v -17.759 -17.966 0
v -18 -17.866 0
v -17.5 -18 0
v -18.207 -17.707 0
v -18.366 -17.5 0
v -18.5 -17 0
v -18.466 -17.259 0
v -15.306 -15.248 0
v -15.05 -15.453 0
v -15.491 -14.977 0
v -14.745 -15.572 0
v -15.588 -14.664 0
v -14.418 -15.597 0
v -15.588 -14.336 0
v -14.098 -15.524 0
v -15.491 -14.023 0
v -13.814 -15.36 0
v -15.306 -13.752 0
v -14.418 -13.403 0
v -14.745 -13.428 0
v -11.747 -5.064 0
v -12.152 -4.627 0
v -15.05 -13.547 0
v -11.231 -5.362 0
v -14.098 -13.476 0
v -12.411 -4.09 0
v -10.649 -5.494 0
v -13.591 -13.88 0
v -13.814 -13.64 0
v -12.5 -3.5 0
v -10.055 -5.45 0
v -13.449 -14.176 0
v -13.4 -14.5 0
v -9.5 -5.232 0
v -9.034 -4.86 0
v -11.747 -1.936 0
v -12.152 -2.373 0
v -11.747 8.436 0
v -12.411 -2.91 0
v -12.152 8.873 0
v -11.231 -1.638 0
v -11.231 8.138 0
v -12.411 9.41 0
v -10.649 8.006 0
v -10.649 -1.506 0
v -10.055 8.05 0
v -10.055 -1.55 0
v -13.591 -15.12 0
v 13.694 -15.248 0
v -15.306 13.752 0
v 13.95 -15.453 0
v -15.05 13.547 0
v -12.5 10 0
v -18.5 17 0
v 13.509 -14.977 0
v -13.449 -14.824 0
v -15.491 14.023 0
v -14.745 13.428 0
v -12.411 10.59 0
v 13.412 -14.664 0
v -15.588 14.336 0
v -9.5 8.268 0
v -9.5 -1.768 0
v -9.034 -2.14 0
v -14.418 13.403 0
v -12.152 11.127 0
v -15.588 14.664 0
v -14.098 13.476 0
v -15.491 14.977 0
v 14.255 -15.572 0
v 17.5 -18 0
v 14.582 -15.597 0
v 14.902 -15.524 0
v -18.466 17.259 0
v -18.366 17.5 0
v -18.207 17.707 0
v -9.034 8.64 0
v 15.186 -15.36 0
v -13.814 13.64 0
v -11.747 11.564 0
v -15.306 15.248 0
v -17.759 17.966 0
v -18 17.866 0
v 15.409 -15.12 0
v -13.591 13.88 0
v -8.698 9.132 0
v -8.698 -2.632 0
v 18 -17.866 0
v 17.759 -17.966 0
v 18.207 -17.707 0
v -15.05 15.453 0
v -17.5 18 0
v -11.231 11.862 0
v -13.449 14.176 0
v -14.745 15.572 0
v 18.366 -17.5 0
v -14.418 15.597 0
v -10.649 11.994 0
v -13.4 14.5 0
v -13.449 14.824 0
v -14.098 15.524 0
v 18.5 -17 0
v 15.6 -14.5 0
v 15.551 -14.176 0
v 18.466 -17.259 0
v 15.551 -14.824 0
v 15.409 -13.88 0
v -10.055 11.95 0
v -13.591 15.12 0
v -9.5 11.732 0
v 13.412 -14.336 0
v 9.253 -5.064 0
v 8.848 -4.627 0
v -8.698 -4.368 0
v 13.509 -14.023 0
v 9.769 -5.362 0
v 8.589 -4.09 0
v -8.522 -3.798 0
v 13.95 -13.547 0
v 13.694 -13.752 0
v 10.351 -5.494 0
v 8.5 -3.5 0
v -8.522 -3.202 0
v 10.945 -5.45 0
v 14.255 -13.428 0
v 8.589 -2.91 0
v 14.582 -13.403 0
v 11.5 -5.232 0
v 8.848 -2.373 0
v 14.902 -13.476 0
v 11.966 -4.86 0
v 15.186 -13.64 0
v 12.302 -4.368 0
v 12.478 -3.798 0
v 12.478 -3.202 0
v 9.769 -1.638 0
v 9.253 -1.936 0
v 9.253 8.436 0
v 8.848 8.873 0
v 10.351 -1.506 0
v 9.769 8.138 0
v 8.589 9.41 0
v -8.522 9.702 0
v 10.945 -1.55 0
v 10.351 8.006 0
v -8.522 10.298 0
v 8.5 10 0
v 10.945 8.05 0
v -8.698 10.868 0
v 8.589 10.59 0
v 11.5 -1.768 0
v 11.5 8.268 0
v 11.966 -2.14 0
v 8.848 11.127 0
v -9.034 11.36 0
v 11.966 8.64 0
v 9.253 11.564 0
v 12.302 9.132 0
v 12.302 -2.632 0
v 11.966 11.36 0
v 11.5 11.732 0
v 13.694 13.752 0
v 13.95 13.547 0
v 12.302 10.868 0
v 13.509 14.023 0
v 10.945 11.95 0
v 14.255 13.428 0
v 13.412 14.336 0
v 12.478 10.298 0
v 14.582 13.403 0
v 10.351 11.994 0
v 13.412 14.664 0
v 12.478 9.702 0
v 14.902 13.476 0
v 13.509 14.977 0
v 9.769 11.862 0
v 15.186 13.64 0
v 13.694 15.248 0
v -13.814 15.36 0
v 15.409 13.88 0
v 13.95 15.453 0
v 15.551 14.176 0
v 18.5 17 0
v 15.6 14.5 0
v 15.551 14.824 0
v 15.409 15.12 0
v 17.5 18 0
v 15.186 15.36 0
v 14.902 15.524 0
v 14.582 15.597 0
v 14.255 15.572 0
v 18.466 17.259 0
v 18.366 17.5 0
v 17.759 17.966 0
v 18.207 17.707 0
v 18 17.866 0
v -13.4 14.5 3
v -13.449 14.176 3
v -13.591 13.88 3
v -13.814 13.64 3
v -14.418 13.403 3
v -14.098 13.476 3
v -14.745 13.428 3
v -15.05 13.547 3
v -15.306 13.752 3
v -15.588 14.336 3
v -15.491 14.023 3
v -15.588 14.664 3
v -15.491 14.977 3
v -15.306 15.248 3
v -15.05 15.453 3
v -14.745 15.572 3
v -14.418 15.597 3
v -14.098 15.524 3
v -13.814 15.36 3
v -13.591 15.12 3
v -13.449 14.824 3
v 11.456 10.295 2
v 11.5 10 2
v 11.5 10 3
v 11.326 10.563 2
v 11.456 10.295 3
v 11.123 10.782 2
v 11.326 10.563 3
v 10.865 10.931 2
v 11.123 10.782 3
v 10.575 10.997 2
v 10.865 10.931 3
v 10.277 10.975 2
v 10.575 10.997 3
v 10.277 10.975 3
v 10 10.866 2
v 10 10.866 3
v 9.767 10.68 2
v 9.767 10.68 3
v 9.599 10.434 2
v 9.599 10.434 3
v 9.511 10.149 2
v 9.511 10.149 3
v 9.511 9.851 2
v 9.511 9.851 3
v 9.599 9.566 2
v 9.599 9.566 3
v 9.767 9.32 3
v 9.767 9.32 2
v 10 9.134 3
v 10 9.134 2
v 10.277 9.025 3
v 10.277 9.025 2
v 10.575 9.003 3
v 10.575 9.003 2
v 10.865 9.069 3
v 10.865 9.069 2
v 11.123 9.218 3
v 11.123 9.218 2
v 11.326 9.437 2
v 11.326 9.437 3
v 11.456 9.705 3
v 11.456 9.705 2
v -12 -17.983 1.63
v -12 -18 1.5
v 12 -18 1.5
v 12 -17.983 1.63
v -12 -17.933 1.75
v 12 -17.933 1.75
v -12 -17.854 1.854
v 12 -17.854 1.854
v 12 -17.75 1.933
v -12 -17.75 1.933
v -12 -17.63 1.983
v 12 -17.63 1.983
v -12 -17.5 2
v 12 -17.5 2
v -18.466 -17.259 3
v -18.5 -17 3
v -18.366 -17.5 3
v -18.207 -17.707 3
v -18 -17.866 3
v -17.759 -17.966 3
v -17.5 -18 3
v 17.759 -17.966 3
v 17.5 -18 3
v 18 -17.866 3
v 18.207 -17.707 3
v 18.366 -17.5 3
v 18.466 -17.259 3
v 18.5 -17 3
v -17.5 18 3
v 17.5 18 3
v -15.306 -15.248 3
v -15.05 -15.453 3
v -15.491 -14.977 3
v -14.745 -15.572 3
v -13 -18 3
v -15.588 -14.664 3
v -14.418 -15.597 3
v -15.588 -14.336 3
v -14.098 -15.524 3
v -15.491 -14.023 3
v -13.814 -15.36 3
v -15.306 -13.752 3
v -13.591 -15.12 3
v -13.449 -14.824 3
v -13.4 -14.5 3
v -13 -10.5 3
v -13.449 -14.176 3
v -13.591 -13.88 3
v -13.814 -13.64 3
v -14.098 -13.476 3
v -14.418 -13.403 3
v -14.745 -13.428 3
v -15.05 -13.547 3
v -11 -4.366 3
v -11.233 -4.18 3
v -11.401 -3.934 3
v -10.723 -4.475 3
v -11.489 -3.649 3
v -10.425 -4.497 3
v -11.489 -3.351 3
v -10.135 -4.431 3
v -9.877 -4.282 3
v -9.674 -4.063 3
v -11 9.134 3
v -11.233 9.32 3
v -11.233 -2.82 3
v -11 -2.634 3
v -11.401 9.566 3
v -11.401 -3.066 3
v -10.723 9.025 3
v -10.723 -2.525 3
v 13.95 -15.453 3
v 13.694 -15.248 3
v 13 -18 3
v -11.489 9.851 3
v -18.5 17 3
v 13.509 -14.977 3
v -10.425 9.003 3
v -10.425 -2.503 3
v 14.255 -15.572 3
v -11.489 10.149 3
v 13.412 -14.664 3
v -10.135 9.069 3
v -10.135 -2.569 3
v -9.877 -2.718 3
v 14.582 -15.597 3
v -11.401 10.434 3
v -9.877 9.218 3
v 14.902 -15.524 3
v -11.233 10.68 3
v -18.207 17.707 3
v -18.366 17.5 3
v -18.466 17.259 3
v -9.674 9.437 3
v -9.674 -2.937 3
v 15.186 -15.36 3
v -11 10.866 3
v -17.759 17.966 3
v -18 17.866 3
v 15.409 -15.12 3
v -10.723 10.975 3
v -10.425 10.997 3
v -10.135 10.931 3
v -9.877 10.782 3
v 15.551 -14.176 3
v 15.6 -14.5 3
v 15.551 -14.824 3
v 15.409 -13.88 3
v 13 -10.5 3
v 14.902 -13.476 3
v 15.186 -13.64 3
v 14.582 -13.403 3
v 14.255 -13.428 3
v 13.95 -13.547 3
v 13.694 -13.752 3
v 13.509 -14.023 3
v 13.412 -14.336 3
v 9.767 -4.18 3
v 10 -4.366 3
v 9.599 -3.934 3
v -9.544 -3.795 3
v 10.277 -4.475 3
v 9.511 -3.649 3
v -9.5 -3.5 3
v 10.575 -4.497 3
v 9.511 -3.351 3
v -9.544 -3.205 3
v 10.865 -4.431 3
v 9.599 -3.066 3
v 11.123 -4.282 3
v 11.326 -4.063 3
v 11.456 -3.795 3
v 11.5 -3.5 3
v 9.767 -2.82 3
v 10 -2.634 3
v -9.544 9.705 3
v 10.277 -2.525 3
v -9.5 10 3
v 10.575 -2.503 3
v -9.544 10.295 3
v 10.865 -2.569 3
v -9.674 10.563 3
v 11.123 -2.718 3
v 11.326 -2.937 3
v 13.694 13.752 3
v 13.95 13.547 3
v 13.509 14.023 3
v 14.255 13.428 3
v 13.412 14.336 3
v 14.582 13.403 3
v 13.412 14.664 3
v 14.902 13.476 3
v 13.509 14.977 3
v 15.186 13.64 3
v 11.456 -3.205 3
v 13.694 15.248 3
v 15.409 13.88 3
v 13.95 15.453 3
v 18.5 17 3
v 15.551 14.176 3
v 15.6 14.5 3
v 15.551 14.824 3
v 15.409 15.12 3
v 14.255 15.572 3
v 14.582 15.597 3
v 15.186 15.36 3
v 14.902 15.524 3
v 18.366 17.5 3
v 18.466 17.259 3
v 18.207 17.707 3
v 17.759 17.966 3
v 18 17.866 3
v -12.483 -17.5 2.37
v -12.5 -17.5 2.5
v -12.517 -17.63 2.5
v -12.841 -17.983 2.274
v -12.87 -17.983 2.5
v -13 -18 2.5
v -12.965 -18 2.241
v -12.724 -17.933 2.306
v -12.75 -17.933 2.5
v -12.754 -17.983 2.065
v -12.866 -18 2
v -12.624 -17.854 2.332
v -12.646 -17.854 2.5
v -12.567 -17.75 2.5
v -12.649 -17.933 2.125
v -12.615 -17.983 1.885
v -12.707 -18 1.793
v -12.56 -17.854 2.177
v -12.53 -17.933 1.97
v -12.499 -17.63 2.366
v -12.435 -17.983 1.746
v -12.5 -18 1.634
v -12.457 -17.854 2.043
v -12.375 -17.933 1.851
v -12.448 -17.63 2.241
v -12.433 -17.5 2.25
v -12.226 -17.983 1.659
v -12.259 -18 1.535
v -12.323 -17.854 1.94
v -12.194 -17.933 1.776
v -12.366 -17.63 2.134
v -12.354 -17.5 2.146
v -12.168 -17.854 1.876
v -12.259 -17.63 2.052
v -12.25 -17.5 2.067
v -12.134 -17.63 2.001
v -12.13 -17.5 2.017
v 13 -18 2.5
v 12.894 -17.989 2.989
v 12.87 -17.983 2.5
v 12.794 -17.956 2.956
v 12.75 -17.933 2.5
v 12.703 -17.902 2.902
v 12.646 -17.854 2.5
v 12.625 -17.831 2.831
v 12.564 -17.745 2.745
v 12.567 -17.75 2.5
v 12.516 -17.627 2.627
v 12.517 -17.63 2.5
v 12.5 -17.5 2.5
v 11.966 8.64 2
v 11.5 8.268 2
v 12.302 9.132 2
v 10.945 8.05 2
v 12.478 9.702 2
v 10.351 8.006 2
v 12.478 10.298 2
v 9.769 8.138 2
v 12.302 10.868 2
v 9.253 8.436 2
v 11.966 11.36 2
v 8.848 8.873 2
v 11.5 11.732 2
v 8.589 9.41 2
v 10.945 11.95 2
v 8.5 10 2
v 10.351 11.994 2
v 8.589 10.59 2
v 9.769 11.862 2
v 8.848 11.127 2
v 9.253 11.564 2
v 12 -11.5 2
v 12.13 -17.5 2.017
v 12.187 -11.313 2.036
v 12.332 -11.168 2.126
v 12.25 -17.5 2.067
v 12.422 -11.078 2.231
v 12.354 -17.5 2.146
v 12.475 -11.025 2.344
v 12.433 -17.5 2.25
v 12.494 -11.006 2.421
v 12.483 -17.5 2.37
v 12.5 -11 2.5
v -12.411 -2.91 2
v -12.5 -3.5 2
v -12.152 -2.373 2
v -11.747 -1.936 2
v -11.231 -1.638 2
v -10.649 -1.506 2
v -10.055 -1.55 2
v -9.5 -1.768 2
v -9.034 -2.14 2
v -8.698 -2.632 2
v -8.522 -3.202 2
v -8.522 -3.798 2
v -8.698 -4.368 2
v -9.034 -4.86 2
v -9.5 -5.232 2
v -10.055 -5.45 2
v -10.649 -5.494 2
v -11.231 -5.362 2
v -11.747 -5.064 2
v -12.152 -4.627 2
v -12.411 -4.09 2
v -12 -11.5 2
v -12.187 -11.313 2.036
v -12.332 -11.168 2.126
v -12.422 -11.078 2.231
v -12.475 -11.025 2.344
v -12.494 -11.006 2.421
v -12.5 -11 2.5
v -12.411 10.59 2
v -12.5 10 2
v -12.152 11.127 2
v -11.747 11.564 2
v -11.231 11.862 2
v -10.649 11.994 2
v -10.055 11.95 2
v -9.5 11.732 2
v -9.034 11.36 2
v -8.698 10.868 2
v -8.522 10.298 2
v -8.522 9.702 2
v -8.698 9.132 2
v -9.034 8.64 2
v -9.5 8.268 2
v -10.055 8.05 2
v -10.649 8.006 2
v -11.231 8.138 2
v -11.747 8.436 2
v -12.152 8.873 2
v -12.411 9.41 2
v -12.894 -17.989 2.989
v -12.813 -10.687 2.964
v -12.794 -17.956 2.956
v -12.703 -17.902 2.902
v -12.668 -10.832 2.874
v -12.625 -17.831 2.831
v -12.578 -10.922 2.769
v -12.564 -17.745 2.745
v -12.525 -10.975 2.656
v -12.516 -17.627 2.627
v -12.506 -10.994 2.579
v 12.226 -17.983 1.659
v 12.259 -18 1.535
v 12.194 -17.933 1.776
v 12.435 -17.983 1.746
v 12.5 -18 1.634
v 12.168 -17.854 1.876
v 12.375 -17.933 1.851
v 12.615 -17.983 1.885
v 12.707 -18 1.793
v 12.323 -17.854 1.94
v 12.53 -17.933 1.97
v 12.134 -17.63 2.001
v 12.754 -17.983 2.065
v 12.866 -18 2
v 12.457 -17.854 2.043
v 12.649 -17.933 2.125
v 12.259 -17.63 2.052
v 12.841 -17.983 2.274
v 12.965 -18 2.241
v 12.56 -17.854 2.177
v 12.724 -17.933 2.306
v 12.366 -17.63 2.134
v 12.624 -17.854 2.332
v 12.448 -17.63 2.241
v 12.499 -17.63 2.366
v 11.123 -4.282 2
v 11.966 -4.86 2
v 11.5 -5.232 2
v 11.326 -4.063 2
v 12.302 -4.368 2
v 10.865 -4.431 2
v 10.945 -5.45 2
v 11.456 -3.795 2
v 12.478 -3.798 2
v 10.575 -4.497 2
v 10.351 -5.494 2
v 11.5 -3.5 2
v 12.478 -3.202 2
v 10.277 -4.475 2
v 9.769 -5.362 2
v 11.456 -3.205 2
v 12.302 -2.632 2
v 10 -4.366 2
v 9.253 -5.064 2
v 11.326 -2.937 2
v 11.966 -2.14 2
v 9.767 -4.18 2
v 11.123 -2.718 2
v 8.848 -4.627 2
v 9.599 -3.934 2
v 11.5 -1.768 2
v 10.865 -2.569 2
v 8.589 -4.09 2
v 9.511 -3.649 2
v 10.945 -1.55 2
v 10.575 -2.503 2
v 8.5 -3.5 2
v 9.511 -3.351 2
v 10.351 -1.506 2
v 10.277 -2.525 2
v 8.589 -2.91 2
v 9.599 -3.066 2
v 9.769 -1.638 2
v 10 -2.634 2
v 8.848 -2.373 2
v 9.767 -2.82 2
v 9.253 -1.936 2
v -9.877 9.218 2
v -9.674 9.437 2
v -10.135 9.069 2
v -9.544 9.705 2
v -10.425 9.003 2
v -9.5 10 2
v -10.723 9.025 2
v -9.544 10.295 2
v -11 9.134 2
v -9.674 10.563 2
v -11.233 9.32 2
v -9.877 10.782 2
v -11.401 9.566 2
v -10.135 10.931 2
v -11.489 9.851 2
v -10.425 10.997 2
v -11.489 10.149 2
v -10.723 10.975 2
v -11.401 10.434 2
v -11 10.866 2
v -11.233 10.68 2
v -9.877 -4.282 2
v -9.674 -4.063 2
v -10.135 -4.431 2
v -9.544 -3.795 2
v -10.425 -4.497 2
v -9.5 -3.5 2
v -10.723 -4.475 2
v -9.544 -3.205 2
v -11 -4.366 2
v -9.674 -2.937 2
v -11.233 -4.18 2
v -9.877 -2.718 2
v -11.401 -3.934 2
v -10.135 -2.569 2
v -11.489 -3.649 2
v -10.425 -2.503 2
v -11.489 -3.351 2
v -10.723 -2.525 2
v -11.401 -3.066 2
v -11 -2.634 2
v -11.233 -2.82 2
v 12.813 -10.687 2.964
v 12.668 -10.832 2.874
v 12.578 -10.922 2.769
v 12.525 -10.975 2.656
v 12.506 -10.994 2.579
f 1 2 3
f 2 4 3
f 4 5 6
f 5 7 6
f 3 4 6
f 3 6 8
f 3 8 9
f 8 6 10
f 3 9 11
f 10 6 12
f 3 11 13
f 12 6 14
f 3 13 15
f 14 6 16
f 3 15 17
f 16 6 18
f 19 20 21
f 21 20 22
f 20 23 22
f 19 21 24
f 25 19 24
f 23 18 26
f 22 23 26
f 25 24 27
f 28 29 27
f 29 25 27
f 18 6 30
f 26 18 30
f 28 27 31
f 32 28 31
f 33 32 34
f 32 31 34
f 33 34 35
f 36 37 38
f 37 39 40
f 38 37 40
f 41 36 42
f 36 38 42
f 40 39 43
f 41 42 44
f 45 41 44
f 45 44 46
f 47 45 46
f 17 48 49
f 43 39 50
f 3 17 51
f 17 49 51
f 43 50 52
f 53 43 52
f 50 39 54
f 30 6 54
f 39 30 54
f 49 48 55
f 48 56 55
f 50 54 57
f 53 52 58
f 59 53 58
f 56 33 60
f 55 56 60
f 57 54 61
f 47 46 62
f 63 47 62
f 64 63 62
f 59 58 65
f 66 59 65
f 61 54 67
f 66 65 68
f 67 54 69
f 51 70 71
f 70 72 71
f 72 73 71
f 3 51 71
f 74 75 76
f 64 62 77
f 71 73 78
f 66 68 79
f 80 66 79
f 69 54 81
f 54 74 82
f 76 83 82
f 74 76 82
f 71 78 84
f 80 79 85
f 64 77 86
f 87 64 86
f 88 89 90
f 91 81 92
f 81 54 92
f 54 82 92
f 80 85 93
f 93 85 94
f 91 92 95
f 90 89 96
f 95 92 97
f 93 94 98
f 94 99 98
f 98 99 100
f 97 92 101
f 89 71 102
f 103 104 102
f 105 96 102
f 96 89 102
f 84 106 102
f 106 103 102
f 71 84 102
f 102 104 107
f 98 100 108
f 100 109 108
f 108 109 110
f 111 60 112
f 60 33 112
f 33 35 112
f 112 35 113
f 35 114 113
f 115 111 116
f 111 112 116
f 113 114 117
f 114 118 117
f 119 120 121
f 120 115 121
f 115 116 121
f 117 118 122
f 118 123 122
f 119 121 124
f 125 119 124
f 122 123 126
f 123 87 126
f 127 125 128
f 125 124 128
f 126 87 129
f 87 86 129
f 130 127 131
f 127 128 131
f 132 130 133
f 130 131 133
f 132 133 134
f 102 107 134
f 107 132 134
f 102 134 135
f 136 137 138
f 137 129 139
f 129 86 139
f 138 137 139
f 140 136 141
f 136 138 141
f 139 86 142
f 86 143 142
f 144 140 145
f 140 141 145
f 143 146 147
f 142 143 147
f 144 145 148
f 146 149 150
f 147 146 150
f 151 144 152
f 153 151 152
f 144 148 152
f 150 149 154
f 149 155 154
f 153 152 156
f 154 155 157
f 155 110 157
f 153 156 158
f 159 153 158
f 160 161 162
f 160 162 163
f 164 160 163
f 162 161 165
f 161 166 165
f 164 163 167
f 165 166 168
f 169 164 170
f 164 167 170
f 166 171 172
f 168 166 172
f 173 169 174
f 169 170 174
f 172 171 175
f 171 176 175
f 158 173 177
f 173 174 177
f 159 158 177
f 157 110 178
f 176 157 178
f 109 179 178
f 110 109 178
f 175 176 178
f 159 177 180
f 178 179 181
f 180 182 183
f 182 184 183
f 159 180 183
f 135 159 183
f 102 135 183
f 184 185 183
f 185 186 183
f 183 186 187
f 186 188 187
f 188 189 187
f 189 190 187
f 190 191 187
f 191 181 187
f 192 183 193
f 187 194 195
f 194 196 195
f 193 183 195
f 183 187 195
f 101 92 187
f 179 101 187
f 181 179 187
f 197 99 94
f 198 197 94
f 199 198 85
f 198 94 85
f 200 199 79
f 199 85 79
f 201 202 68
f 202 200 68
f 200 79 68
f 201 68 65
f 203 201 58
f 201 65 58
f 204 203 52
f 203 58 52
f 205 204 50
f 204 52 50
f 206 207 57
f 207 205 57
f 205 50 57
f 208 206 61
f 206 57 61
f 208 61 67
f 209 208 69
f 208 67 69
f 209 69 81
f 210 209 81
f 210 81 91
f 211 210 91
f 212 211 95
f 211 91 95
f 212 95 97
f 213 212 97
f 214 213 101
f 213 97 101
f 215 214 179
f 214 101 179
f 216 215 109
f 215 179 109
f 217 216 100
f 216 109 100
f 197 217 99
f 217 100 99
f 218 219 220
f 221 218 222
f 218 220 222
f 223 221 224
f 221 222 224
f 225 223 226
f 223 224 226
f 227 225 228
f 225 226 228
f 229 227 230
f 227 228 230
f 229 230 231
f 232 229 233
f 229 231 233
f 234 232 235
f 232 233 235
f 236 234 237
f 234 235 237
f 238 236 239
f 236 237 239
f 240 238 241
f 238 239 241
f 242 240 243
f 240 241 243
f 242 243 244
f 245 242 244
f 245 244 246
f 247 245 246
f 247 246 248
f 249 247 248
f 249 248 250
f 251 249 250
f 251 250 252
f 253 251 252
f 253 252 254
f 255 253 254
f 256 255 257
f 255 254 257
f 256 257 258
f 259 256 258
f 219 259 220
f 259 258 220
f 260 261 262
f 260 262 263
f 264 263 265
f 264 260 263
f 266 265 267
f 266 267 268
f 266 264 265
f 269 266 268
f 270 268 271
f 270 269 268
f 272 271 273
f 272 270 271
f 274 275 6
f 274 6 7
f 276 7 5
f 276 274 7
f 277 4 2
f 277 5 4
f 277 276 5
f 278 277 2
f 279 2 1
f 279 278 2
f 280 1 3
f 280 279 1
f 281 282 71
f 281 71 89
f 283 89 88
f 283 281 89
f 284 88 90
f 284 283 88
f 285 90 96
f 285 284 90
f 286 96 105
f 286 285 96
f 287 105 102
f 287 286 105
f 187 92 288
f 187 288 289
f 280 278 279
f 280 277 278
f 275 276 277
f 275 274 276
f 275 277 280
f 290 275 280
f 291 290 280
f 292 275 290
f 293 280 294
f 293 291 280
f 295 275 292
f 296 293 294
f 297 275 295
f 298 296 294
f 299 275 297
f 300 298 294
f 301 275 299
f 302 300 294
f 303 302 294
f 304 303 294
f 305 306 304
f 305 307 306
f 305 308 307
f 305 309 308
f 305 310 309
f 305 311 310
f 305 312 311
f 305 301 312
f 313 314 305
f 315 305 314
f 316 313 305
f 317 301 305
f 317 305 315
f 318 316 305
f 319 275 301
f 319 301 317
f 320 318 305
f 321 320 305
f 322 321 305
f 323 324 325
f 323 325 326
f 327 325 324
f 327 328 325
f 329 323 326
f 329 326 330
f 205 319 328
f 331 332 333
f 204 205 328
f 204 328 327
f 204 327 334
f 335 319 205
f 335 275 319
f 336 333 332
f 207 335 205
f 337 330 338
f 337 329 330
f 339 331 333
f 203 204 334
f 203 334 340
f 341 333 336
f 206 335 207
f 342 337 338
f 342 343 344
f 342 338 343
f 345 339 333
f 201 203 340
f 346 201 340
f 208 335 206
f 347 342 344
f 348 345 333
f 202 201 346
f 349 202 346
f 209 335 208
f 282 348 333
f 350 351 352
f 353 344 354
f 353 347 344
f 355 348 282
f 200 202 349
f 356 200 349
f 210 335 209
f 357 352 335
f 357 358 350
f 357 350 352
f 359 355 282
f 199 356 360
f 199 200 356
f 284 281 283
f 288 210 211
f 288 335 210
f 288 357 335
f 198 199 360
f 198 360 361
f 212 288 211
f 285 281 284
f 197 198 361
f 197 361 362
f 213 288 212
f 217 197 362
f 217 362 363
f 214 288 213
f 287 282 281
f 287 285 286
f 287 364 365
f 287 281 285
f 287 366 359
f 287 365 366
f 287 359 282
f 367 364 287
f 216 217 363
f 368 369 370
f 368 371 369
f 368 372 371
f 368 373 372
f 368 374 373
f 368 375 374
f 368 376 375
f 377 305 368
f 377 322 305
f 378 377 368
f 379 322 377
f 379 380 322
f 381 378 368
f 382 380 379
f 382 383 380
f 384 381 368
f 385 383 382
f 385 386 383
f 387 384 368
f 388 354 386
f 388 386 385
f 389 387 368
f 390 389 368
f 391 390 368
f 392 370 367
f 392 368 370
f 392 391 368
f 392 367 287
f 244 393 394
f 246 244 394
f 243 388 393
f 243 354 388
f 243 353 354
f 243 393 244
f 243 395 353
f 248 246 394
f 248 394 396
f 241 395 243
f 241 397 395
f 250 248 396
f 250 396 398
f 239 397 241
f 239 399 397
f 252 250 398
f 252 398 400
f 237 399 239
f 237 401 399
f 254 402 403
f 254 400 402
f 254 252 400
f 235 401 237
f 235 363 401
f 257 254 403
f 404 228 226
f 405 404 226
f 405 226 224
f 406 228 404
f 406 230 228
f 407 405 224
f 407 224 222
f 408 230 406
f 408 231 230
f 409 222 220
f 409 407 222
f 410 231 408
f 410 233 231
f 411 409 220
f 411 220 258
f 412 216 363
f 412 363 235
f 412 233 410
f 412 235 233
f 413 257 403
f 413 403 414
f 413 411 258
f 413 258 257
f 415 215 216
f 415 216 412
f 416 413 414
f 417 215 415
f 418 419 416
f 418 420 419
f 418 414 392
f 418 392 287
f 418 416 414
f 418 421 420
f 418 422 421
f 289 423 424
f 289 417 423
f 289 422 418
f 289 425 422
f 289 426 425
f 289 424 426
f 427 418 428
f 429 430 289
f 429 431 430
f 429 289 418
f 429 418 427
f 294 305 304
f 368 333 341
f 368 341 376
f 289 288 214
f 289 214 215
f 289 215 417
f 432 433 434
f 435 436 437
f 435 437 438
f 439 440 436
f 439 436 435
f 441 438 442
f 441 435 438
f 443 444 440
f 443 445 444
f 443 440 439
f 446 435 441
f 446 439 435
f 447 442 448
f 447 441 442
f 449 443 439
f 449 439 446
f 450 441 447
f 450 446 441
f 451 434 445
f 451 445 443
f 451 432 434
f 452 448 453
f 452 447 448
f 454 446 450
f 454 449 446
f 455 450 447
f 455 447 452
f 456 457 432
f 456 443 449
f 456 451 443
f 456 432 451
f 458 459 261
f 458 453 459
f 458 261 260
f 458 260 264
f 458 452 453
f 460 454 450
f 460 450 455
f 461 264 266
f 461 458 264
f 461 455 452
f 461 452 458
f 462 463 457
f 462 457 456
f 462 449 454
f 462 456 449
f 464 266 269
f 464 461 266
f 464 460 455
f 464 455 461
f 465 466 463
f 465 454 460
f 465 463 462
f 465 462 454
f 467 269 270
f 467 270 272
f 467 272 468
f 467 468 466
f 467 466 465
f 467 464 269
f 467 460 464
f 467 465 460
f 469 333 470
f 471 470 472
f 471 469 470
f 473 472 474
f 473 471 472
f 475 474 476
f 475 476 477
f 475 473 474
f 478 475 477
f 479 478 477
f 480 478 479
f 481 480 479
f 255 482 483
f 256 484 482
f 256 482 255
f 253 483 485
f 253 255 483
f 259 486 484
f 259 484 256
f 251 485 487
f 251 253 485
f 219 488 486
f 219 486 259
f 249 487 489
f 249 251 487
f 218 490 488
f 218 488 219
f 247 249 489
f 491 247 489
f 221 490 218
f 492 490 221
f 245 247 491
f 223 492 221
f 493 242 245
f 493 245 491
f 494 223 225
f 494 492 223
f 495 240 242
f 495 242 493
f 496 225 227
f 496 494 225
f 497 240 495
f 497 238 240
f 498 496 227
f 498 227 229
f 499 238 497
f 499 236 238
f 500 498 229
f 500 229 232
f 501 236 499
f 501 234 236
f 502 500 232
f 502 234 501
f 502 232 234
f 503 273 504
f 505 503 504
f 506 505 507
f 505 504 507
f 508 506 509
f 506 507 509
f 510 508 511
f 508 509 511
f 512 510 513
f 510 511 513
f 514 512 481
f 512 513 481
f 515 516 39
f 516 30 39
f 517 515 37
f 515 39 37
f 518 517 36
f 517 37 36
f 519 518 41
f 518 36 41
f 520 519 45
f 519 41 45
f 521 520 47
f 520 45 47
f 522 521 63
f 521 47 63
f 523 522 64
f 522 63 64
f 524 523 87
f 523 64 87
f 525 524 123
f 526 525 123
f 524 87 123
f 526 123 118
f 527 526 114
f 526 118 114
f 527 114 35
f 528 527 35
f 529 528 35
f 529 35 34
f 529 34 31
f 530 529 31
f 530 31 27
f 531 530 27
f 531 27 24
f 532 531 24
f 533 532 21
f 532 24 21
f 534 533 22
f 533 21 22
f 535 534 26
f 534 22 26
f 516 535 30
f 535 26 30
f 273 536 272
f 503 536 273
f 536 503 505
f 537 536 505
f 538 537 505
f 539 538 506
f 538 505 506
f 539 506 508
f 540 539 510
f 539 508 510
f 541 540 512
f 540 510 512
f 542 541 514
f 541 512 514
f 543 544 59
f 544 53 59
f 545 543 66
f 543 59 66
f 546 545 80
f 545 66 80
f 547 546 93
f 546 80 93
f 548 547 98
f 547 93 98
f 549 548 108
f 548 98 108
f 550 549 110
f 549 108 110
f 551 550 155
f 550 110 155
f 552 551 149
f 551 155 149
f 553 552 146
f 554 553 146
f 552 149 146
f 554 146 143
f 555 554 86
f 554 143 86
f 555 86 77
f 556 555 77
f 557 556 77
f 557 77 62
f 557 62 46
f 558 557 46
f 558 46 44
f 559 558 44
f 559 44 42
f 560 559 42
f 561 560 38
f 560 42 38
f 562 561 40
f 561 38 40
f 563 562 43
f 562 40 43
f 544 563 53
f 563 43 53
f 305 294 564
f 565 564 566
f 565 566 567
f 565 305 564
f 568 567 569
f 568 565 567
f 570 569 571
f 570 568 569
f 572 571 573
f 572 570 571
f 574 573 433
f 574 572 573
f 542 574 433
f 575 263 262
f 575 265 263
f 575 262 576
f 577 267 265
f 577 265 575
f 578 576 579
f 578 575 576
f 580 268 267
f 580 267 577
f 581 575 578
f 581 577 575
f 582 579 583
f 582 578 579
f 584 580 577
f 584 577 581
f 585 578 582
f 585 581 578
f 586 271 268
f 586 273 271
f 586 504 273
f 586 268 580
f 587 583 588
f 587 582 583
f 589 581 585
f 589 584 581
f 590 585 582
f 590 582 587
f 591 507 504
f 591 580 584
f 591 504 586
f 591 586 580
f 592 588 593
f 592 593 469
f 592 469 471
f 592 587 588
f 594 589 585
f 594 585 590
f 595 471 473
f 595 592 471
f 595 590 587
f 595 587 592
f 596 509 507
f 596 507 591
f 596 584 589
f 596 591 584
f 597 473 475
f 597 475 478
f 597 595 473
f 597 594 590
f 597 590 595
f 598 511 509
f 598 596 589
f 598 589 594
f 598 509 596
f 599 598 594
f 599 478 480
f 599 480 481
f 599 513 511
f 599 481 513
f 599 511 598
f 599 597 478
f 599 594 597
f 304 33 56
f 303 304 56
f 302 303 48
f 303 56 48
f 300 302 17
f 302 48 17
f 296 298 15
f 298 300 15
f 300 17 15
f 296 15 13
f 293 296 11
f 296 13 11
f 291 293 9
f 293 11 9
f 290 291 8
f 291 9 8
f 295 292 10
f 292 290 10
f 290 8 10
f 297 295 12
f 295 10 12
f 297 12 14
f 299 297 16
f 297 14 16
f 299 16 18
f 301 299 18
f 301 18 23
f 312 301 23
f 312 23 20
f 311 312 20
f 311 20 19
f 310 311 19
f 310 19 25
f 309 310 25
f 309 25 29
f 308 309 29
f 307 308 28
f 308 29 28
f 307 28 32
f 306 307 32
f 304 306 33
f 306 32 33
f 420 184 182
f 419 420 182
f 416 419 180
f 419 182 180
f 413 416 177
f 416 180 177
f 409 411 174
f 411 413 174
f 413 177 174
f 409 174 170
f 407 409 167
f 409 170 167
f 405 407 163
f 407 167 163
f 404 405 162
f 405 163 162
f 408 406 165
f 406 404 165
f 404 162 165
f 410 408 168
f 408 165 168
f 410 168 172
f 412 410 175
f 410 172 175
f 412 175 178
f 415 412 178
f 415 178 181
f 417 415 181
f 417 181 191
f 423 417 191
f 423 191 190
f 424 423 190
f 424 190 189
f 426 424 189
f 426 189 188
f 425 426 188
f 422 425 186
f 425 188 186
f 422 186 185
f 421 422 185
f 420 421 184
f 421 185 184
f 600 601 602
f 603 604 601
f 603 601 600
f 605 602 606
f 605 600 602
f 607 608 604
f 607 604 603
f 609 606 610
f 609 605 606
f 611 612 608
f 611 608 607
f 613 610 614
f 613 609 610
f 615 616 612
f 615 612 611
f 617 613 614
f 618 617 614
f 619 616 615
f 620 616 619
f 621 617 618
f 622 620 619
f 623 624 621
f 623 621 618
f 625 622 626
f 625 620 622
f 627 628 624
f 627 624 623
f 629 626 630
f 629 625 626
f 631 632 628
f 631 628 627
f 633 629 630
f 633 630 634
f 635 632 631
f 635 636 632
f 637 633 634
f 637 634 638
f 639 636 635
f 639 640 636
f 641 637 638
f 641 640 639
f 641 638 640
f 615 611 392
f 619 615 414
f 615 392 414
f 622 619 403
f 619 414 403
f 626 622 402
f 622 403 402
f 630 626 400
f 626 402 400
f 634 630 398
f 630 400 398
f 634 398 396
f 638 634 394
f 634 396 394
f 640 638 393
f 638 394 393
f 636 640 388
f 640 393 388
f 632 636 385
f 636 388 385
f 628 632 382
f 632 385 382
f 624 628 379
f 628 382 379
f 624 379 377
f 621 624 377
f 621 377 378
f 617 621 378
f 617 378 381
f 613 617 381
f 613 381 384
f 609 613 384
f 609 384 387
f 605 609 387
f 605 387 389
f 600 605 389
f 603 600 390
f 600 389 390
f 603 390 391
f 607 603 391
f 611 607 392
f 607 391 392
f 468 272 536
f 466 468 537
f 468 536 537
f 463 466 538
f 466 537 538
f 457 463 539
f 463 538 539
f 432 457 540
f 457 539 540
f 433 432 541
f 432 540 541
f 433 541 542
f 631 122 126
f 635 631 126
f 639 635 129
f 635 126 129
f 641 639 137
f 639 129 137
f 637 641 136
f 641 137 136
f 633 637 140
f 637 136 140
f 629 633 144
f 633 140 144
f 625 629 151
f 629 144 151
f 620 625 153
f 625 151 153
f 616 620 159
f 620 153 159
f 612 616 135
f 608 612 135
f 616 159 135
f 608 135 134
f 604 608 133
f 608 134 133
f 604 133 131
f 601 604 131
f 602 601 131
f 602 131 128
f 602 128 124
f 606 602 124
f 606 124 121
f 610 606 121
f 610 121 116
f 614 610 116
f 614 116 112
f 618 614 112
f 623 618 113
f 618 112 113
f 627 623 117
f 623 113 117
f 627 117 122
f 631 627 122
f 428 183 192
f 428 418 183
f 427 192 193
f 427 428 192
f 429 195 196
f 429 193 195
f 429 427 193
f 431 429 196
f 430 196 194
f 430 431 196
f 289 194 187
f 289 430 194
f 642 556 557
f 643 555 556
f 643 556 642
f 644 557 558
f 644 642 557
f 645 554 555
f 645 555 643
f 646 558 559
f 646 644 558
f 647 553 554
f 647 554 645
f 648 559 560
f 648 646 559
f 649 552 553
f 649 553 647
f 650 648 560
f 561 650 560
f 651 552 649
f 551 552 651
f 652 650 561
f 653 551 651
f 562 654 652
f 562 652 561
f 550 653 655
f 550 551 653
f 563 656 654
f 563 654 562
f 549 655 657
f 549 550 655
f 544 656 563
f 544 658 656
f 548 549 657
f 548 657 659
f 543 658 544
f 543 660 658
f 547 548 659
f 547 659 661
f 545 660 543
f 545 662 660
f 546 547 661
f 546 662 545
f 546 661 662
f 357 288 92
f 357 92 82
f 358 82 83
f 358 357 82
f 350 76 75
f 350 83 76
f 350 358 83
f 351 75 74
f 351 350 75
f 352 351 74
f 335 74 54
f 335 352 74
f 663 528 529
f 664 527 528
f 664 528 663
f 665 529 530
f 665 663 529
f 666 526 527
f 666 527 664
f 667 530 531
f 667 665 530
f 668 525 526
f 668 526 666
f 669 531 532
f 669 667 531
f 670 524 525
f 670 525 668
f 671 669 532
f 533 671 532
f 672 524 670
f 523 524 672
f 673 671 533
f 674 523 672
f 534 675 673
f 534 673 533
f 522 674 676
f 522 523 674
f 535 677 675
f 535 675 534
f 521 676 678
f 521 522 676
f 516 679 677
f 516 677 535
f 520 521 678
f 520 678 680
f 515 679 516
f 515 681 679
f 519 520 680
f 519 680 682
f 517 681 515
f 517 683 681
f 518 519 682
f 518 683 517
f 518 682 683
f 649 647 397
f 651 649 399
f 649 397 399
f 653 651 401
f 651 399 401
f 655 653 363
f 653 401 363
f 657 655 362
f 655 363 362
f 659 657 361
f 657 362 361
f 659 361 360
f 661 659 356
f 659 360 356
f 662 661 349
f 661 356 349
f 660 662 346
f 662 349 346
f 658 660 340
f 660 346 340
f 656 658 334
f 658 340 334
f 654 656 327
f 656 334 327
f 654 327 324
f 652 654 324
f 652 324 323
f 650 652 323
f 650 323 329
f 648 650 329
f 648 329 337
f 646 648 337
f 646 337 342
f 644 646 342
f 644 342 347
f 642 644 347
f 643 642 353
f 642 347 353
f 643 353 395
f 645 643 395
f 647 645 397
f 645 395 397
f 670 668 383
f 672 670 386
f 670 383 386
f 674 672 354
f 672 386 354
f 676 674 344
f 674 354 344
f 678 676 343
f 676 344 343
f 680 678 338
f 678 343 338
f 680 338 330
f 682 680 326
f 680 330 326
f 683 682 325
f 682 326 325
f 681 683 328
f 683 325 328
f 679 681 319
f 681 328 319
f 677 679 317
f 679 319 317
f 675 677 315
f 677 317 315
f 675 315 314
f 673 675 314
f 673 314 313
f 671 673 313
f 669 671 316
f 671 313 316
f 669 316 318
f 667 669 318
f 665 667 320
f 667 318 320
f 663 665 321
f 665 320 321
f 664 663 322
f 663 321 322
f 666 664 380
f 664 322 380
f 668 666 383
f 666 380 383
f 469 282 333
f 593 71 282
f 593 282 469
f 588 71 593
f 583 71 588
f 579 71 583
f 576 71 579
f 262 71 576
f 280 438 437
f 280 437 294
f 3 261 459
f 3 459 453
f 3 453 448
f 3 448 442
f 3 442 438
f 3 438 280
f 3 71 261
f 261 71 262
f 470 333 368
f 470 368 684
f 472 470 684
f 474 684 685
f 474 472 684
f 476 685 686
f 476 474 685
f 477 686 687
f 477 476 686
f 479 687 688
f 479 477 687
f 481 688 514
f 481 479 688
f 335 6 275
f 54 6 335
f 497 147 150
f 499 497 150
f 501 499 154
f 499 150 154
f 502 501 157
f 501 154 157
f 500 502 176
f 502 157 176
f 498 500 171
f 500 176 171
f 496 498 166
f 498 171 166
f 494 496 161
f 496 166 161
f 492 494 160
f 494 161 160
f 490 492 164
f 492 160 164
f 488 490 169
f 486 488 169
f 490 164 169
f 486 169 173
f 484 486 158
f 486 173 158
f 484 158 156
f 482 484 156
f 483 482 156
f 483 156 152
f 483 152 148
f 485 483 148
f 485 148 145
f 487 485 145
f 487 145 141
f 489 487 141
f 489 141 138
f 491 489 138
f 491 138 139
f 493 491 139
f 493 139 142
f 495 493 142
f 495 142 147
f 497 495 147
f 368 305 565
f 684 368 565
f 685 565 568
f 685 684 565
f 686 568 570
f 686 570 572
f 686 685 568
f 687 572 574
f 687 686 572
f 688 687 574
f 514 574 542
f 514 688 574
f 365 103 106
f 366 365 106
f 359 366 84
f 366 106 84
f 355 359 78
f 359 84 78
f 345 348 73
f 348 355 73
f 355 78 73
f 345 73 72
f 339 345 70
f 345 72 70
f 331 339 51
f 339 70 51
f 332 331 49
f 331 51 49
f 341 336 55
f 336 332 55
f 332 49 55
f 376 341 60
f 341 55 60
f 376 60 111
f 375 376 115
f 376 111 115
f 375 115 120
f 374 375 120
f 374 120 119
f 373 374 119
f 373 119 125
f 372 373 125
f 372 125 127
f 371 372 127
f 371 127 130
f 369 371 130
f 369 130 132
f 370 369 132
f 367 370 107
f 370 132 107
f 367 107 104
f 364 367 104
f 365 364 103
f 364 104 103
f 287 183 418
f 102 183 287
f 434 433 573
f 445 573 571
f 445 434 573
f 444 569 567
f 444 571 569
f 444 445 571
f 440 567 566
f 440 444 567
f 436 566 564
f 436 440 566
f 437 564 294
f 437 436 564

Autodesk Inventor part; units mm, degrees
ref_plane "YZ Plane" through (0, 0, 0) normal (1, 0, 0) x (0, 1, 0)
ref_plane "XZ Plane" through (0, 0, 0) normal (0, 1, 0) x (-1, 0, 0)
ref_plane "XY Plane" through (0, 0, 0) normal (0, 0, 1) x (1, 0, 0)
sketch "Эскиз1" plane through (0, 0, 0) normal (0, 0, 1) x (1, 0, 0)
  line L0 (18.5, -18) -> (-18.5, -18)
  line L1 (-18.5, -18) -> (-18.5, 18)
  line L2 (-18.5, 18) -> (18.5, 18)
  line L3 (18.5, 18) -> (18.5, -18)
  line L4 (18.5, -18) -> (-18.5, 18) construction
  line L5 (-18.5, -18) -> (18.5, 18) construction
  line L6 (-14.5, -14.5) -> (14.5, -14.5) construction
  line L7 (14.5, -14.5) -> (14.5, 14.5) construction
  line L8 (14.5, 14.5) -> (-14.5, 14.5) construction
  line L9 (-14.5, 14.5) -> (-14.5, -14.5) construction
  line L10 (-14.5, -14.5) -> (14.5, 14.5) construction
  line L11 (14.5, -14.5) -> (-14.5, 14.5) construction
  circle A0 centre (-14.5, 14.5) radius 1.1
  circle A1 centre (14.5, 14.5) radius 1.1
  circle A2 centre (-14.5, -14.5) radius 1.1
  circle A3 centre (14.5, -14.5) radius 1.1
  point P0 (0, 0)
  dimension "d0" = 37
  dimension "d1" = 36
  dimension "d2" = 29
  dimension "d3" = 29
  dimension "d4" = 2.2
  dimension "d7" = 29
  dimension "d10" = 29
extrude "Выдавливание1" add sketch "Эскиз1" along normal blind 3
fillet "Сопряжение1" radius 1 4 edges at (-18.5, 18, 1.5) (18.5, 18, 1.5) (18.5, -18, 1.5) (-18.5, -18, 1.5)
sketch "Эскиз2" plane through (0, 0, 3) normal (0, 0, 1) x (1, 0, 0)
  circle A0 centre (10.5, -3.5) radius 1 projected
  circle A1 centre (10.5, 10) radius 1 projected
  circle A2 centre (-10.5, 10) radius 1 projected
  circle A3 centre (-10.5, -3.5) radius 1 projected
  point P0 (0, 0)
extrude "Выдавливание2" cut sketch "Эскиз2" against normal blind 3
sketch "Эскиз3" plane through (0, 0, 0) normal (0, 0, -1) x (-1, 0, 0)
  circle A0 centre (10.5, -3.5) radius 1 projected
  circle A1 centre (-10.5, -3.5) radius 1 projected
  circle A2 centre (10.5, 10) radius 1 projected
  circle A3 centre (-10.5, 10) radius 1 projected
  circle A4 centre (10.5, -3.5) radius 2
  circle A5 centre (-10.5, -3.5) radius 2
  circle A6 centre (-10.5, 10) radius 2
  circle A7 centre (10.5, 10) radius 2
  point P0 (0, 0)
  dimension "d18" = 1
  dimension "d19" = 1
  dimension "d20" = 1
  dimension "d21" = 1
extrude "Выдавливание3" cut sketch "Эскиз3" against normal blind 2
sketch "Эскиз4" plane through (0, 0, 3) normal (0, 0, 1) x (1, 0, 0)
  line L0 (-12.5, -12) -> (12.5, -12) construction
  line L1 (12.5, -12) -> (12.5, -18) construction
  line L2 (-17.5, -18) -> (17.5, -18) construction
  line L3 (-12.5, -12) -> (-12.5, -18) construction
  line L4 (12.5, -18) -> (-12.5, -18)
  line L5 (-12.5, -18) -> (-12.5, -11)
  line L6 (-12.5, -11) -> (12.5, -11)
  line L7 (12.5, -11) -> (12.5, -18)
  point P0 (0, 0)
  dimension "d24" = 7
extrude "Выдавливание4" cut sketch "Эскиз4" against normal blind 1
fillet "Сопряжение2" radius 0.5 9 edges at (0, -11, 3) (0, -11, 2) (0, -18, 2) (12.5, -18, 2.5) (12.5, -14.5, 2) (-12.5, -18, 2.5) (-12.5, -14.5, 2) (12.5, -14.5, 3) (-12.5, -14.5, 3)
properties part number "крепеж камеры"
